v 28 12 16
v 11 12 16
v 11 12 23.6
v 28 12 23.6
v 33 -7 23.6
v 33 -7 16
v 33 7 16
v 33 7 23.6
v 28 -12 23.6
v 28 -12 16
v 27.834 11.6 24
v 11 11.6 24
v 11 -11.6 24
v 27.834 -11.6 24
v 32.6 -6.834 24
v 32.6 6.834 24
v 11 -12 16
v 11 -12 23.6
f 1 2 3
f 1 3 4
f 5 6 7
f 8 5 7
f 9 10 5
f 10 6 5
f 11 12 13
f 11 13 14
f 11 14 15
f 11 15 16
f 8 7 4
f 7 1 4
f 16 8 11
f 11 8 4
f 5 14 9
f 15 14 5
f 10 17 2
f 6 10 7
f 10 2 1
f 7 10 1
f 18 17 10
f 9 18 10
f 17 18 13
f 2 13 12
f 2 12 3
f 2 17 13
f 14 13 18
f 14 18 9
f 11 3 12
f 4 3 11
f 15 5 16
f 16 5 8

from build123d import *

# Parameters (mm, degrees)
BOX032_W                                   = 22
BOX032_H                                   = 24
BOX032_DEPTH                               = 8
CHAMFER004013007011015006009007001004_SIZE = 5
CHAMFER004013007011015006009007001005_SIZE = 0.4


with BuildPart() as part:
    # Box032 → Box032 (new body)
    with BuildSketch(Plane(origin=(11, -12, 16), x_dir=(1, 0, 0), z_dir=(0, 0, 1))):
        with Locations((11, 12)):
            Rectangle(BOX032_W, BOX032_H)
    extrude(amount=BOX032_DEPTH)

    # Chamfer004013007011015006009007001004
    chamfer004013007011015006009007001004_edges = [part.edges().sort_by_distance(p)[0] for p in [
        (33, -12, 20),
        (33, 12, 20),
    ]]
    chamfer(chamfer004013007011015006009007001004_edges, length=CHAMFER004013007011015006009007001004_SIZE)

    # Chamfer004013007011015006009007001005
    chamfer004013007011015006009007001005_edges = [part.edges().sort_by_distance(p)[0] for p in [
        (33, 0, 24),
        (19.5, 12, 24),
        (19.5, -12, 24),
        (30.5, -9.5, 24),
        (30.5, 9.5, 24),
    ]]
    chamfer(chamfer004013007011015006009007001005_edges, length=CHAMFER004013007011015006009007001005_SIZE)


solid = part.part
